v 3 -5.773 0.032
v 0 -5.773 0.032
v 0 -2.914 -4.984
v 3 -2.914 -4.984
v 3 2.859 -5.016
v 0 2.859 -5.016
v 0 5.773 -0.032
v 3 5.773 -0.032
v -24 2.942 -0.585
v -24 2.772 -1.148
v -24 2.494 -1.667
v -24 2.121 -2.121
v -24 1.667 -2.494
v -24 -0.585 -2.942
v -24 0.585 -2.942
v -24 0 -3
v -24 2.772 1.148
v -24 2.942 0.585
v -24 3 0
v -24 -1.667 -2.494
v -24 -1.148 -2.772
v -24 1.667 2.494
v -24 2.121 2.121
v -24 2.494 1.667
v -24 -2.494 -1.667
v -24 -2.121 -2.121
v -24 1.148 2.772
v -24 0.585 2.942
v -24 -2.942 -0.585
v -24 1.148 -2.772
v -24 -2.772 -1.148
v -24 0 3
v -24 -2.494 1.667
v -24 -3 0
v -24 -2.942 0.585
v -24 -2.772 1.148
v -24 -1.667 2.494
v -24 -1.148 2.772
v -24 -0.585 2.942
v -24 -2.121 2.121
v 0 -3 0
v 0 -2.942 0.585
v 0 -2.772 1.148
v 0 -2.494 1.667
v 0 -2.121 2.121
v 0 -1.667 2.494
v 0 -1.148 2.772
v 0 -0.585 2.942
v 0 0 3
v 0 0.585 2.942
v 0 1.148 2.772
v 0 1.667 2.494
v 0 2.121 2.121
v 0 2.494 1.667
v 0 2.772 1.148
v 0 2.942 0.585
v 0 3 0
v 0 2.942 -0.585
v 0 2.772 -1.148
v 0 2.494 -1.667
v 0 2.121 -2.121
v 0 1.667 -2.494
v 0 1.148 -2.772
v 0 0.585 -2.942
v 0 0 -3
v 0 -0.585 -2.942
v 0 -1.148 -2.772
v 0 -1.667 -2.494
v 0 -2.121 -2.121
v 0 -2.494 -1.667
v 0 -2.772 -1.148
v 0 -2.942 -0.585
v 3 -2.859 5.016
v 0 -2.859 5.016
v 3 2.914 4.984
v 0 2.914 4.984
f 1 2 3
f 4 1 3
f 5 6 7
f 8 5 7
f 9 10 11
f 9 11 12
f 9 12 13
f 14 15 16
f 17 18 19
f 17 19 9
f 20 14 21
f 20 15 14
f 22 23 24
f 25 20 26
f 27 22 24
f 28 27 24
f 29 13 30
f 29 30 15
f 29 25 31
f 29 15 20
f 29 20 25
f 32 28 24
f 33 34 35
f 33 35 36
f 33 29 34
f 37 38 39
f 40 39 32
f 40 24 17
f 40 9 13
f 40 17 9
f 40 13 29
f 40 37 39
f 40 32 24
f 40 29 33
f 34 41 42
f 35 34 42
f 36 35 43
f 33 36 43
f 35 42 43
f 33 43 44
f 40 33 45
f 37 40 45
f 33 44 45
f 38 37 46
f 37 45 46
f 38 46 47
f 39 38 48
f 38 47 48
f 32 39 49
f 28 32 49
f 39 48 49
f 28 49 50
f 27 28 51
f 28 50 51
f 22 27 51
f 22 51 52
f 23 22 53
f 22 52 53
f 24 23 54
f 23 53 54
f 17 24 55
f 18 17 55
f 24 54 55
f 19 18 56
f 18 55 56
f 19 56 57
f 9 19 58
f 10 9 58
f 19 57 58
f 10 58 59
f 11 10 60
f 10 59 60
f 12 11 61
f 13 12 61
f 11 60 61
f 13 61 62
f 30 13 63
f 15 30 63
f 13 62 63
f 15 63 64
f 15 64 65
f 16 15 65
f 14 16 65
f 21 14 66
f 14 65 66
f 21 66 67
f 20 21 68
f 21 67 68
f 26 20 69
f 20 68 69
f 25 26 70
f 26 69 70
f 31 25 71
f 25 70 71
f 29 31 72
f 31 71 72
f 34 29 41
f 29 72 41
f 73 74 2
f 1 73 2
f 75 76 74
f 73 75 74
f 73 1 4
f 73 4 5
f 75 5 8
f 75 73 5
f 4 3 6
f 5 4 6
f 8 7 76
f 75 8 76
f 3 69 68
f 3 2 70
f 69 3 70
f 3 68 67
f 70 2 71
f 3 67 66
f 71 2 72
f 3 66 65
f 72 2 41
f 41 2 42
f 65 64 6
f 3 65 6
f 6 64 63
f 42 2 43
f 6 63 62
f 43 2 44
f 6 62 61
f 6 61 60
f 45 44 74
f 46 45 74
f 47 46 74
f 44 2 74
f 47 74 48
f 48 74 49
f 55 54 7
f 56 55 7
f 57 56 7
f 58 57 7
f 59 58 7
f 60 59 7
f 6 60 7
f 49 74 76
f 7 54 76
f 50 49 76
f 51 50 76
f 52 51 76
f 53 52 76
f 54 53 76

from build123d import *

# Parameters (mm, degrees)
F1_DEPTH = 3
F2_R     = 3
F3_DEPTH = 24


# Not quite as in the source:
# - a feature names something its author has since deleted; it is built from what else it names


with BuildPart() as f1:
    # F0 (on Right) → F1 (new body)
    with BuildSketch(Plane.YZ):
        Polygon((5.7734155665, -0.0317179771), (2.9141763572, 4.9840655586), (-2.8592392093, 5.0157835357), (-5.7734155665, 0.0317179771), (-2.9141763572, -4.9840655586), (2.8592392093, -5.0157835357), align=None)
    extrude(amount=F1_DEPTH)

    # F2 (on face) → F3 (join)
    with BuildSketch(Plane(origin=(0, 0, 0), x_dir=(0, -1, 0), z_dir=(-1, 0, 0))):
        Circle(F2_R)
    extrude(amount=F3_DEPTH)


solid = f1.part
